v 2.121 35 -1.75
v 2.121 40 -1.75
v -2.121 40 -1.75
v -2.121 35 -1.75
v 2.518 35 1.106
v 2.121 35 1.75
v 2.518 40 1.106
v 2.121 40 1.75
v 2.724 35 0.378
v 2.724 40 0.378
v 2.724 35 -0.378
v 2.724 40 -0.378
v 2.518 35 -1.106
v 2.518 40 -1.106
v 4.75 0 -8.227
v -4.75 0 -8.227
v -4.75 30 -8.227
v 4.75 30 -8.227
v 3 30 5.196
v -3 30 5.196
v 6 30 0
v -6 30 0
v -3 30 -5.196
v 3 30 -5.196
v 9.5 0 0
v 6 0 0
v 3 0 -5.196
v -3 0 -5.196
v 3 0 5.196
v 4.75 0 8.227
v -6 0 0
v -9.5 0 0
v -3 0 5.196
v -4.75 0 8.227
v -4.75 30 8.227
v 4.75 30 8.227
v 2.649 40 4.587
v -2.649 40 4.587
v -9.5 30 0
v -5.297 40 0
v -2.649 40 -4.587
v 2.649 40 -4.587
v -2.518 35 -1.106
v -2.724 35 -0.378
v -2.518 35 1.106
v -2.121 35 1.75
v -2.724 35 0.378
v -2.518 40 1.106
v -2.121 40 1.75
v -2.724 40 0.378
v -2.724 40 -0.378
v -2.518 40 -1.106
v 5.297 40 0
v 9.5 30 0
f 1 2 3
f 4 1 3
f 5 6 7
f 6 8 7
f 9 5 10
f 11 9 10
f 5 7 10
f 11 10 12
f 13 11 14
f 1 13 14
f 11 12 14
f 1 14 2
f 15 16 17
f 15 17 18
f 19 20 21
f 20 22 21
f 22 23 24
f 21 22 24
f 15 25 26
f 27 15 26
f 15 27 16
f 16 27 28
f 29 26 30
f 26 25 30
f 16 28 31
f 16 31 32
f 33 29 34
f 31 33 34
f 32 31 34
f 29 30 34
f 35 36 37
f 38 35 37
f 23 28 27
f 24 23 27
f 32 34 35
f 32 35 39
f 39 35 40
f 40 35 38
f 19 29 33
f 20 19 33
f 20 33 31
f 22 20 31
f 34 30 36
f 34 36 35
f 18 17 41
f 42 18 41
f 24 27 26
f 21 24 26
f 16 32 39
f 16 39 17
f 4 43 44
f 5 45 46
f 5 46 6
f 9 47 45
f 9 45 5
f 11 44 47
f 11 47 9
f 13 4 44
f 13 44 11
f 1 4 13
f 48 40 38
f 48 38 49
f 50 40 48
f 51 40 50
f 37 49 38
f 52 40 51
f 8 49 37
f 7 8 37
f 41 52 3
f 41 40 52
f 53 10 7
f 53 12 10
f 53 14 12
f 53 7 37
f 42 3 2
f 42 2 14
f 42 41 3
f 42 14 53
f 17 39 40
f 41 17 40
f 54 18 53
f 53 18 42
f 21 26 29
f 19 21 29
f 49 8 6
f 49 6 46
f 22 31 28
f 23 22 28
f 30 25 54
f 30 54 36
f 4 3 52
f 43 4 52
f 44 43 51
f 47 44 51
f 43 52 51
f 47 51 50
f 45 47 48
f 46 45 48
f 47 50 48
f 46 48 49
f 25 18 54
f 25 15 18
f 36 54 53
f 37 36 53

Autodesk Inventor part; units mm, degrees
ref_plane "YZ Plane" through (0, 0, 0) normal (1, 0, 0) x (0, 1, 0)
ref_plane "XZ Plane" through (0, 0, 0) normal (0, 1, 0) x (-1, 0, 0)
ref_plane "XY Plane" through (0, 0, 0) normal (0, 0, 1) x (1, 0, 0)
sketch "Boceto16" plane through (0, 0, 0) normal (0, 1, 0) x (-1, 0, 0)
  line L0 (0, 0) -> (6, 0)
  line L1 (6, 0) -> (3, -5.1962)
  line L2 (3, -5.1962) -> (-3, -5.1962)
  line L3 (-3, -5.1962) -> (-6, 0)
  line L4 (-6, 0) -> (-3, 5.1962)
  line L5 (-3, 5.1962) -> (3, 5.1962)
  line L6 (3, 5.1962) -> (6, 0)
  line L7 (6, 0) -> (9.5, 0)
  line L8 (9.5, 0) -> (4.75, -8.2272)
  line L9 (4.75, -8.2272) -> (-4.75, -8.2272)
  line L10 (-4.75, -8.2272) -> (-9.5, 0)
  line L11 (-9.5, 0) -> (-4.75, 8.2272)
  line L12 (-4.75, 8.2272) -> (4.75, 8.2272)
  line L13 (4.75, 8.2272) -> (9.5, 0)
  dimension "d55" = 6
  dimension "d56" = 3.5
extrude "Extrusión10" add sketch "Boceto16" along normal blind 30
sketch "Boceto17" plane through (0, 30, 0) normal (0, 1, 0) x (1, 0, 0)
  line L0 (-9.5, 0) -> (-4.75, -8.2272) projected
  line L1 (-9.5, 0) -> (-4.75, 8.2272)
  line L2 (-4.75, 8.2272) -> (4.75, 8.2272)
  line L3 (4.75, 8.2272) -> (9.5, 0)
  line L4 (9.5, 0) -> (4.75, -8.2272)
  line L5 (4.75, -8.2272) -> (-4.75, -8.2272)
  line L6 (-4.75, -8.2272) -> (-9.5, 0)
  point P0 (0, 0)
  point P1 (0, 0)
extrude "Extrusión11" add sketch "Boceto17" along normal blind 10 draft -20
sketch "Boceto18" plane through (0, 40, 0) normal (0, 1, 0) x (1, 0, 0)
  line L0 (0, 1.75) -> (2.1213, 1.75)
  line L1 (0, -1.75) -> (2.1213, -1.75)
  line L2 (0, -1.75) -> (-2.1213, -1.75)
  line L3 (0, 1.75) -> (-2.1213, 1.75)
  arc A0 (-2.1213, 1.75) -> (-2.1213, -1.75) centre (0, 0) ccw
  arc A1 (2.1213, -1.75) -> (2.1213, 1.75) centre (0, 0) ccw
extrude "Extrusión12" cut sketch "Boceto18" against normal blind 5
